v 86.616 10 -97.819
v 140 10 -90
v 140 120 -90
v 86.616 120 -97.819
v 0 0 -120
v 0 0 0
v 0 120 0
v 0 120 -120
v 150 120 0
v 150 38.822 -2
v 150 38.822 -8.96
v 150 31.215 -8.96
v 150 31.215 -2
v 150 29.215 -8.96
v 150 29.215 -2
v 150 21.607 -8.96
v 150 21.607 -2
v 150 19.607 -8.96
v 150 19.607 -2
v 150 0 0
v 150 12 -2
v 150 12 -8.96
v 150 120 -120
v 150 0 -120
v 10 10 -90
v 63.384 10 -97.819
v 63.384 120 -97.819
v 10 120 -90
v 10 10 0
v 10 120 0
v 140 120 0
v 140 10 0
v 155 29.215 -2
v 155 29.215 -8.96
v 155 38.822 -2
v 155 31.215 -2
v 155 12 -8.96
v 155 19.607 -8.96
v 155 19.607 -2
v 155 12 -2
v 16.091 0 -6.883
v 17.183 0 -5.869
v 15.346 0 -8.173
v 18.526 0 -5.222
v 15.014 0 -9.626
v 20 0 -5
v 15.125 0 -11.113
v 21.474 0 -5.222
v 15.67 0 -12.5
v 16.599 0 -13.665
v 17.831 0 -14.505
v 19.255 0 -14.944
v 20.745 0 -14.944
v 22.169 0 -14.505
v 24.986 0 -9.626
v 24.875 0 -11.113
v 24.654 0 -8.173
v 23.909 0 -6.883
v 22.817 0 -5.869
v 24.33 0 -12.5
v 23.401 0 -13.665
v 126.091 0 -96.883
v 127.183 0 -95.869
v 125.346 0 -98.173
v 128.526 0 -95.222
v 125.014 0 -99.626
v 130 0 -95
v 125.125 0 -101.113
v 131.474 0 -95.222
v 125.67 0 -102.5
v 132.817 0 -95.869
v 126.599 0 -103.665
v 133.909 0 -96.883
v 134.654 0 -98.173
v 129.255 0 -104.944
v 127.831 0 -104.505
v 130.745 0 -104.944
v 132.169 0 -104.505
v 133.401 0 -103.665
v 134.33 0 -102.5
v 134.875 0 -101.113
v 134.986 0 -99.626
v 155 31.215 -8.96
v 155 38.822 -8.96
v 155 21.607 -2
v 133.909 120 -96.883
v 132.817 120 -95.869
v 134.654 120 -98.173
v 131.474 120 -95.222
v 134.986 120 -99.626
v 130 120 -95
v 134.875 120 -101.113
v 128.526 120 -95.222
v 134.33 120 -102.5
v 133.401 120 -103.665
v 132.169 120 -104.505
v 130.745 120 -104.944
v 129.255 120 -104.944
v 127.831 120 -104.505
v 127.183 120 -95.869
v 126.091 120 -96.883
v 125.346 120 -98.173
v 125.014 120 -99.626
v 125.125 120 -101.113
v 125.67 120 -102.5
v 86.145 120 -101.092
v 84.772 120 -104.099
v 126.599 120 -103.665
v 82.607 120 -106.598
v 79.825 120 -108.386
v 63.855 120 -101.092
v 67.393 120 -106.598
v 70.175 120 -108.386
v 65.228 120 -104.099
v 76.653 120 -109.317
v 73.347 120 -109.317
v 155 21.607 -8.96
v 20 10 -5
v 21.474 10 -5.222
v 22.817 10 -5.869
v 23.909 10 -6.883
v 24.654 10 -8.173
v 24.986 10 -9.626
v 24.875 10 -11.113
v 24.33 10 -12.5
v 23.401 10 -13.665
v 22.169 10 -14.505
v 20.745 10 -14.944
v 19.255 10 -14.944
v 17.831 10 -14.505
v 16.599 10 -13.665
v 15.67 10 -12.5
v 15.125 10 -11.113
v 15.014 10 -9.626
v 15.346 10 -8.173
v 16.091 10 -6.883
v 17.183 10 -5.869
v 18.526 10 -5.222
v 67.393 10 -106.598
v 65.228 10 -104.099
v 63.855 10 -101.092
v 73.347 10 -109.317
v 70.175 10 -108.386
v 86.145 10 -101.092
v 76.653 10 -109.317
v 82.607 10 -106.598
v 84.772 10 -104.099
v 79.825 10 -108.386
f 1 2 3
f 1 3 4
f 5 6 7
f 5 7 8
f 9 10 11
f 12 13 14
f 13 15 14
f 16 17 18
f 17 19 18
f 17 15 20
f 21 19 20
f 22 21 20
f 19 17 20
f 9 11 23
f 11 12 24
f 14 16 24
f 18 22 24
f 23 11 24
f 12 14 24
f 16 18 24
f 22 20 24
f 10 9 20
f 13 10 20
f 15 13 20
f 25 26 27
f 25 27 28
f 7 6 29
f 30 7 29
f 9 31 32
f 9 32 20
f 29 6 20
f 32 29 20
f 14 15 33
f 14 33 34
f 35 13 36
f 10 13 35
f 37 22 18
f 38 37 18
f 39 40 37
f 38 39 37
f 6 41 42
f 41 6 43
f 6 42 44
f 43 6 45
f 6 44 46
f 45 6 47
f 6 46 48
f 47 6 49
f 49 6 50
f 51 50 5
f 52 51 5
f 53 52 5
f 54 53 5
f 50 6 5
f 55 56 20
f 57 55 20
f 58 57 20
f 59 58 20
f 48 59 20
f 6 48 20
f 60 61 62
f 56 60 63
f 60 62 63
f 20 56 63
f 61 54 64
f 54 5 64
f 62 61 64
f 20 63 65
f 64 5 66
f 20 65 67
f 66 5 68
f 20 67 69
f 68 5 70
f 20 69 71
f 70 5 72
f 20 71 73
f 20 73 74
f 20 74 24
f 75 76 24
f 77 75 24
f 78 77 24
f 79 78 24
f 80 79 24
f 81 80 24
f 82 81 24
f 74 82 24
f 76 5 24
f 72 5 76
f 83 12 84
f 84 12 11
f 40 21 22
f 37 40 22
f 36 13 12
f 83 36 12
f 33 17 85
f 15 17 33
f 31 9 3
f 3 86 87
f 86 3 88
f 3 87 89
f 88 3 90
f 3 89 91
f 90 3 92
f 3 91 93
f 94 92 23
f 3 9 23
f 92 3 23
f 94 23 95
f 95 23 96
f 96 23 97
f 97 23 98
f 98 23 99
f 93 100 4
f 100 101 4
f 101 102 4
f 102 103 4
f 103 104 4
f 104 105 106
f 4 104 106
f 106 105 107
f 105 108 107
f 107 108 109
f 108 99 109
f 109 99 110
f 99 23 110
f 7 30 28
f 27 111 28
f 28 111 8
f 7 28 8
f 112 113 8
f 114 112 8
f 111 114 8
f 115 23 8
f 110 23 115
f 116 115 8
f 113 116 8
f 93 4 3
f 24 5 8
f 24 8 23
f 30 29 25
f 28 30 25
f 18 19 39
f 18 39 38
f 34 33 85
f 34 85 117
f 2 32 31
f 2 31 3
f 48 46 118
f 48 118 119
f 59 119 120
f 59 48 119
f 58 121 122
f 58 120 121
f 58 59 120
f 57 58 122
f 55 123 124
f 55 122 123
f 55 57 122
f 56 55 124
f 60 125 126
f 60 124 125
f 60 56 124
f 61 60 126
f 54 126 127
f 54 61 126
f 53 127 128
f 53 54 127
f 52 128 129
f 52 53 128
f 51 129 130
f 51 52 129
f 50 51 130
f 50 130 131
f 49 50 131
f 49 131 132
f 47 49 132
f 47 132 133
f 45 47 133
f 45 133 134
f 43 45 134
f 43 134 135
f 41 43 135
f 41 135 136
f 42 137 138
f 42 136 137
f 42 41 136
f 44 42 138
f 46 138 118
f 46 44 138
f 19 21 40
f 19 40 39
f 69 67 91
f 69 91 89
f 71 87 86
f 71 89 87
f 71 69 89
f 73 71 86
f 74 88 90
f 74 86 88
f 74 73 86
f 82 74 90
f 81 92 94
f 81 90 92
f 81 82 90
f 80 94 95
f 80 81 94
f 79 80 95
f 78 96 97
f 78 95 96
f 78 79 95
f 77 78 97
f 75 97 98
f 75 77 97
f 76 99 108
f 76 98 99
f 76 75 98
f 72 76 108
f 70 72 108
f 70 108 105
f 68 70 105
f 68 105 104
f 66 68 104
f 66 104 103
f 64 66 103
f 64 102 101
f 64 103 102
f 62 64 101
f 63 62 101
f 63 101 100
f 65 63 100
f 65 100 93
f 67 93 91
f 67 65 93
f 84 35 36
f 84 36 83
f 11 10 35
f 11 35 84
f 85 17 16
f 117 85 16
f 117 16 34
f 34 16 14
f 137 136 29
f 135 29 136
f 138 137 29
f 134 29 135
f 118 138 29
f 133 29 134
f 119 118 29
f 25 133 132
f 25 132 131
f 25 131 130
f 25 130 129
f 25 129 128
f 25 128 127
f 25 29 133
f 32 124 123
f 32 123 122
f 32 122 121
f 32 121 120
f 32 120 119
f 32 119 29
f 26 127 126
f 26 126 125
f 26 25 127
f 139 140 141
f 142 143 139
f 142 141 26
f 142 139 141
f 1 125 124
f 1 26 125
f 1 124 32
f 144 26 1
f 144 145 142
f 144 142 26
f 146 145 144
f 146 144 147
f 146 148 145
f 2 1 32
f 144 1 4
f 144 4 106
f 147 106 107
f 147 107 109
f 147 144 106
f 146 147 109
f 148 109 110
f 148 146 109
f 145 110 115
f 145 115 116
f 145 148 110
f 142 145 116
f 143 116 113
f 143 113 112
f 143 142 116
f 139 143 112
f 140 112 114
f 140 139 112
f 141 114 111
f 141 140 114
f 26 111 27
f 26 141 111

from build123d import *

# Parameters (mm, degrees)
SKETCH1_W                = 150
SKETCH1_H                = 120
BASEBOX_DEPTH            = 120
SKETCH2_W                = 130
SKETCH2_H                = 110
INTERIORCUT_DEPTH        = 110
POSITIONCALIBRATOR_DEPTH = 110
SKETCH6_W                = 6.959896851
SKETCH6_H                = 7.60749883
LASERRECEIVER_DEPTH      = 5
THREADEDROD_DEPTH        = 225.77766793
THREADEDROD_DEPTH_BACK   = 225.77766793
SKETCH3_R                = 5


with BuildPart() as part:
    # Sketch1 → BaseBox (new body)
    with BuildSketch(Plane(origin=(0, 0, 0), x_dir=(1, 0, 0), z_dir=(0, 1, 0))):
        with Locations((75, 60)):
            Rectangle(SKETCH1_W, SKETCH1_H)
    extrude(amount=BASEBOX_DEPTH)

    # Sketch2 → InteriorCut (cut)
    with BuildSketch(Plane(origin=(0, 120, 0), x_dir=(1, 0, 0), z_dir=(0, 1, 0))):
        with Locations((75, 55)):
            Rectangle(SKETCH2_W, SKETCH2_H)
    extrude(amount=-INTERIORCUT_DEPTH, mode=Mode.SUBTRACT)

    # Sketch5 → PositionCalibrator (add)
    with BuildSketch(Plane(origin=(0, 10, 0), x_dir=(1, 0, 0), z_dir=(0, 1, 0))):
        with BuildLine():
            Line((63.383989491, 97.819381253), (10, 90))
            Line((10, 90), (10, 110))
            Line((10, 110), (140, 110))
            Line((140, 110), (140, 90))
            Line((140, 90), (86.616010509, 97.819381253))
            ThreePointArc((86.616010509, 97.819381253), (75, 109.435391763), (63.383989491, 97.819381253))
        make_face()
    extrude(amount=POSITIONCALIBRATOR_DEPTH)

    # Sketch6 → LaserReceiver (add)
    with BuildSketch(Plane(origin=(150, 0, 0), x_dir=(0, 0, -1), z_dir=(1, 0, 0))):
        with Locations((5.479948425, 35.018747075)):
            Rectangle(SKETCH6_W, SKETCH6_H)
        with Locations((5.479948425, 15.803749415)):
            Rectangle(SKETCH6_W, SKETCH6_H)
        with Locations((5.479948425, 25.411248245)):
            Rectangle(SKETCH6_W, SKETCH6_H)
    extrude(amount=LASERRECEIVER_DEPTH)

    # Sketch3 → ThreadedRod (cut, two sides: drawn at the far end of the back side and taken through both)
    with BuildSketch(Plane(origin=(0, 10, 0), x_dir=(1, 0, 0), z_dir=(0, 1, 0)).offset(-THREADEDROD_DEPTH_BACK)):
        with Locations(Location((20, 10, 0), (0, 0, 270))):
            Circle(SKETCH3_R)
        with Locations(Location((130, 100, 0), (0, 0, 270))):
            Circle(SKETCH3_R)
    extrude(amount=THREADEDROD_DEPTH + THREADEDROD_DEPTH_BACK, mode=Mode.SUBTRACT)


solid = part.part
